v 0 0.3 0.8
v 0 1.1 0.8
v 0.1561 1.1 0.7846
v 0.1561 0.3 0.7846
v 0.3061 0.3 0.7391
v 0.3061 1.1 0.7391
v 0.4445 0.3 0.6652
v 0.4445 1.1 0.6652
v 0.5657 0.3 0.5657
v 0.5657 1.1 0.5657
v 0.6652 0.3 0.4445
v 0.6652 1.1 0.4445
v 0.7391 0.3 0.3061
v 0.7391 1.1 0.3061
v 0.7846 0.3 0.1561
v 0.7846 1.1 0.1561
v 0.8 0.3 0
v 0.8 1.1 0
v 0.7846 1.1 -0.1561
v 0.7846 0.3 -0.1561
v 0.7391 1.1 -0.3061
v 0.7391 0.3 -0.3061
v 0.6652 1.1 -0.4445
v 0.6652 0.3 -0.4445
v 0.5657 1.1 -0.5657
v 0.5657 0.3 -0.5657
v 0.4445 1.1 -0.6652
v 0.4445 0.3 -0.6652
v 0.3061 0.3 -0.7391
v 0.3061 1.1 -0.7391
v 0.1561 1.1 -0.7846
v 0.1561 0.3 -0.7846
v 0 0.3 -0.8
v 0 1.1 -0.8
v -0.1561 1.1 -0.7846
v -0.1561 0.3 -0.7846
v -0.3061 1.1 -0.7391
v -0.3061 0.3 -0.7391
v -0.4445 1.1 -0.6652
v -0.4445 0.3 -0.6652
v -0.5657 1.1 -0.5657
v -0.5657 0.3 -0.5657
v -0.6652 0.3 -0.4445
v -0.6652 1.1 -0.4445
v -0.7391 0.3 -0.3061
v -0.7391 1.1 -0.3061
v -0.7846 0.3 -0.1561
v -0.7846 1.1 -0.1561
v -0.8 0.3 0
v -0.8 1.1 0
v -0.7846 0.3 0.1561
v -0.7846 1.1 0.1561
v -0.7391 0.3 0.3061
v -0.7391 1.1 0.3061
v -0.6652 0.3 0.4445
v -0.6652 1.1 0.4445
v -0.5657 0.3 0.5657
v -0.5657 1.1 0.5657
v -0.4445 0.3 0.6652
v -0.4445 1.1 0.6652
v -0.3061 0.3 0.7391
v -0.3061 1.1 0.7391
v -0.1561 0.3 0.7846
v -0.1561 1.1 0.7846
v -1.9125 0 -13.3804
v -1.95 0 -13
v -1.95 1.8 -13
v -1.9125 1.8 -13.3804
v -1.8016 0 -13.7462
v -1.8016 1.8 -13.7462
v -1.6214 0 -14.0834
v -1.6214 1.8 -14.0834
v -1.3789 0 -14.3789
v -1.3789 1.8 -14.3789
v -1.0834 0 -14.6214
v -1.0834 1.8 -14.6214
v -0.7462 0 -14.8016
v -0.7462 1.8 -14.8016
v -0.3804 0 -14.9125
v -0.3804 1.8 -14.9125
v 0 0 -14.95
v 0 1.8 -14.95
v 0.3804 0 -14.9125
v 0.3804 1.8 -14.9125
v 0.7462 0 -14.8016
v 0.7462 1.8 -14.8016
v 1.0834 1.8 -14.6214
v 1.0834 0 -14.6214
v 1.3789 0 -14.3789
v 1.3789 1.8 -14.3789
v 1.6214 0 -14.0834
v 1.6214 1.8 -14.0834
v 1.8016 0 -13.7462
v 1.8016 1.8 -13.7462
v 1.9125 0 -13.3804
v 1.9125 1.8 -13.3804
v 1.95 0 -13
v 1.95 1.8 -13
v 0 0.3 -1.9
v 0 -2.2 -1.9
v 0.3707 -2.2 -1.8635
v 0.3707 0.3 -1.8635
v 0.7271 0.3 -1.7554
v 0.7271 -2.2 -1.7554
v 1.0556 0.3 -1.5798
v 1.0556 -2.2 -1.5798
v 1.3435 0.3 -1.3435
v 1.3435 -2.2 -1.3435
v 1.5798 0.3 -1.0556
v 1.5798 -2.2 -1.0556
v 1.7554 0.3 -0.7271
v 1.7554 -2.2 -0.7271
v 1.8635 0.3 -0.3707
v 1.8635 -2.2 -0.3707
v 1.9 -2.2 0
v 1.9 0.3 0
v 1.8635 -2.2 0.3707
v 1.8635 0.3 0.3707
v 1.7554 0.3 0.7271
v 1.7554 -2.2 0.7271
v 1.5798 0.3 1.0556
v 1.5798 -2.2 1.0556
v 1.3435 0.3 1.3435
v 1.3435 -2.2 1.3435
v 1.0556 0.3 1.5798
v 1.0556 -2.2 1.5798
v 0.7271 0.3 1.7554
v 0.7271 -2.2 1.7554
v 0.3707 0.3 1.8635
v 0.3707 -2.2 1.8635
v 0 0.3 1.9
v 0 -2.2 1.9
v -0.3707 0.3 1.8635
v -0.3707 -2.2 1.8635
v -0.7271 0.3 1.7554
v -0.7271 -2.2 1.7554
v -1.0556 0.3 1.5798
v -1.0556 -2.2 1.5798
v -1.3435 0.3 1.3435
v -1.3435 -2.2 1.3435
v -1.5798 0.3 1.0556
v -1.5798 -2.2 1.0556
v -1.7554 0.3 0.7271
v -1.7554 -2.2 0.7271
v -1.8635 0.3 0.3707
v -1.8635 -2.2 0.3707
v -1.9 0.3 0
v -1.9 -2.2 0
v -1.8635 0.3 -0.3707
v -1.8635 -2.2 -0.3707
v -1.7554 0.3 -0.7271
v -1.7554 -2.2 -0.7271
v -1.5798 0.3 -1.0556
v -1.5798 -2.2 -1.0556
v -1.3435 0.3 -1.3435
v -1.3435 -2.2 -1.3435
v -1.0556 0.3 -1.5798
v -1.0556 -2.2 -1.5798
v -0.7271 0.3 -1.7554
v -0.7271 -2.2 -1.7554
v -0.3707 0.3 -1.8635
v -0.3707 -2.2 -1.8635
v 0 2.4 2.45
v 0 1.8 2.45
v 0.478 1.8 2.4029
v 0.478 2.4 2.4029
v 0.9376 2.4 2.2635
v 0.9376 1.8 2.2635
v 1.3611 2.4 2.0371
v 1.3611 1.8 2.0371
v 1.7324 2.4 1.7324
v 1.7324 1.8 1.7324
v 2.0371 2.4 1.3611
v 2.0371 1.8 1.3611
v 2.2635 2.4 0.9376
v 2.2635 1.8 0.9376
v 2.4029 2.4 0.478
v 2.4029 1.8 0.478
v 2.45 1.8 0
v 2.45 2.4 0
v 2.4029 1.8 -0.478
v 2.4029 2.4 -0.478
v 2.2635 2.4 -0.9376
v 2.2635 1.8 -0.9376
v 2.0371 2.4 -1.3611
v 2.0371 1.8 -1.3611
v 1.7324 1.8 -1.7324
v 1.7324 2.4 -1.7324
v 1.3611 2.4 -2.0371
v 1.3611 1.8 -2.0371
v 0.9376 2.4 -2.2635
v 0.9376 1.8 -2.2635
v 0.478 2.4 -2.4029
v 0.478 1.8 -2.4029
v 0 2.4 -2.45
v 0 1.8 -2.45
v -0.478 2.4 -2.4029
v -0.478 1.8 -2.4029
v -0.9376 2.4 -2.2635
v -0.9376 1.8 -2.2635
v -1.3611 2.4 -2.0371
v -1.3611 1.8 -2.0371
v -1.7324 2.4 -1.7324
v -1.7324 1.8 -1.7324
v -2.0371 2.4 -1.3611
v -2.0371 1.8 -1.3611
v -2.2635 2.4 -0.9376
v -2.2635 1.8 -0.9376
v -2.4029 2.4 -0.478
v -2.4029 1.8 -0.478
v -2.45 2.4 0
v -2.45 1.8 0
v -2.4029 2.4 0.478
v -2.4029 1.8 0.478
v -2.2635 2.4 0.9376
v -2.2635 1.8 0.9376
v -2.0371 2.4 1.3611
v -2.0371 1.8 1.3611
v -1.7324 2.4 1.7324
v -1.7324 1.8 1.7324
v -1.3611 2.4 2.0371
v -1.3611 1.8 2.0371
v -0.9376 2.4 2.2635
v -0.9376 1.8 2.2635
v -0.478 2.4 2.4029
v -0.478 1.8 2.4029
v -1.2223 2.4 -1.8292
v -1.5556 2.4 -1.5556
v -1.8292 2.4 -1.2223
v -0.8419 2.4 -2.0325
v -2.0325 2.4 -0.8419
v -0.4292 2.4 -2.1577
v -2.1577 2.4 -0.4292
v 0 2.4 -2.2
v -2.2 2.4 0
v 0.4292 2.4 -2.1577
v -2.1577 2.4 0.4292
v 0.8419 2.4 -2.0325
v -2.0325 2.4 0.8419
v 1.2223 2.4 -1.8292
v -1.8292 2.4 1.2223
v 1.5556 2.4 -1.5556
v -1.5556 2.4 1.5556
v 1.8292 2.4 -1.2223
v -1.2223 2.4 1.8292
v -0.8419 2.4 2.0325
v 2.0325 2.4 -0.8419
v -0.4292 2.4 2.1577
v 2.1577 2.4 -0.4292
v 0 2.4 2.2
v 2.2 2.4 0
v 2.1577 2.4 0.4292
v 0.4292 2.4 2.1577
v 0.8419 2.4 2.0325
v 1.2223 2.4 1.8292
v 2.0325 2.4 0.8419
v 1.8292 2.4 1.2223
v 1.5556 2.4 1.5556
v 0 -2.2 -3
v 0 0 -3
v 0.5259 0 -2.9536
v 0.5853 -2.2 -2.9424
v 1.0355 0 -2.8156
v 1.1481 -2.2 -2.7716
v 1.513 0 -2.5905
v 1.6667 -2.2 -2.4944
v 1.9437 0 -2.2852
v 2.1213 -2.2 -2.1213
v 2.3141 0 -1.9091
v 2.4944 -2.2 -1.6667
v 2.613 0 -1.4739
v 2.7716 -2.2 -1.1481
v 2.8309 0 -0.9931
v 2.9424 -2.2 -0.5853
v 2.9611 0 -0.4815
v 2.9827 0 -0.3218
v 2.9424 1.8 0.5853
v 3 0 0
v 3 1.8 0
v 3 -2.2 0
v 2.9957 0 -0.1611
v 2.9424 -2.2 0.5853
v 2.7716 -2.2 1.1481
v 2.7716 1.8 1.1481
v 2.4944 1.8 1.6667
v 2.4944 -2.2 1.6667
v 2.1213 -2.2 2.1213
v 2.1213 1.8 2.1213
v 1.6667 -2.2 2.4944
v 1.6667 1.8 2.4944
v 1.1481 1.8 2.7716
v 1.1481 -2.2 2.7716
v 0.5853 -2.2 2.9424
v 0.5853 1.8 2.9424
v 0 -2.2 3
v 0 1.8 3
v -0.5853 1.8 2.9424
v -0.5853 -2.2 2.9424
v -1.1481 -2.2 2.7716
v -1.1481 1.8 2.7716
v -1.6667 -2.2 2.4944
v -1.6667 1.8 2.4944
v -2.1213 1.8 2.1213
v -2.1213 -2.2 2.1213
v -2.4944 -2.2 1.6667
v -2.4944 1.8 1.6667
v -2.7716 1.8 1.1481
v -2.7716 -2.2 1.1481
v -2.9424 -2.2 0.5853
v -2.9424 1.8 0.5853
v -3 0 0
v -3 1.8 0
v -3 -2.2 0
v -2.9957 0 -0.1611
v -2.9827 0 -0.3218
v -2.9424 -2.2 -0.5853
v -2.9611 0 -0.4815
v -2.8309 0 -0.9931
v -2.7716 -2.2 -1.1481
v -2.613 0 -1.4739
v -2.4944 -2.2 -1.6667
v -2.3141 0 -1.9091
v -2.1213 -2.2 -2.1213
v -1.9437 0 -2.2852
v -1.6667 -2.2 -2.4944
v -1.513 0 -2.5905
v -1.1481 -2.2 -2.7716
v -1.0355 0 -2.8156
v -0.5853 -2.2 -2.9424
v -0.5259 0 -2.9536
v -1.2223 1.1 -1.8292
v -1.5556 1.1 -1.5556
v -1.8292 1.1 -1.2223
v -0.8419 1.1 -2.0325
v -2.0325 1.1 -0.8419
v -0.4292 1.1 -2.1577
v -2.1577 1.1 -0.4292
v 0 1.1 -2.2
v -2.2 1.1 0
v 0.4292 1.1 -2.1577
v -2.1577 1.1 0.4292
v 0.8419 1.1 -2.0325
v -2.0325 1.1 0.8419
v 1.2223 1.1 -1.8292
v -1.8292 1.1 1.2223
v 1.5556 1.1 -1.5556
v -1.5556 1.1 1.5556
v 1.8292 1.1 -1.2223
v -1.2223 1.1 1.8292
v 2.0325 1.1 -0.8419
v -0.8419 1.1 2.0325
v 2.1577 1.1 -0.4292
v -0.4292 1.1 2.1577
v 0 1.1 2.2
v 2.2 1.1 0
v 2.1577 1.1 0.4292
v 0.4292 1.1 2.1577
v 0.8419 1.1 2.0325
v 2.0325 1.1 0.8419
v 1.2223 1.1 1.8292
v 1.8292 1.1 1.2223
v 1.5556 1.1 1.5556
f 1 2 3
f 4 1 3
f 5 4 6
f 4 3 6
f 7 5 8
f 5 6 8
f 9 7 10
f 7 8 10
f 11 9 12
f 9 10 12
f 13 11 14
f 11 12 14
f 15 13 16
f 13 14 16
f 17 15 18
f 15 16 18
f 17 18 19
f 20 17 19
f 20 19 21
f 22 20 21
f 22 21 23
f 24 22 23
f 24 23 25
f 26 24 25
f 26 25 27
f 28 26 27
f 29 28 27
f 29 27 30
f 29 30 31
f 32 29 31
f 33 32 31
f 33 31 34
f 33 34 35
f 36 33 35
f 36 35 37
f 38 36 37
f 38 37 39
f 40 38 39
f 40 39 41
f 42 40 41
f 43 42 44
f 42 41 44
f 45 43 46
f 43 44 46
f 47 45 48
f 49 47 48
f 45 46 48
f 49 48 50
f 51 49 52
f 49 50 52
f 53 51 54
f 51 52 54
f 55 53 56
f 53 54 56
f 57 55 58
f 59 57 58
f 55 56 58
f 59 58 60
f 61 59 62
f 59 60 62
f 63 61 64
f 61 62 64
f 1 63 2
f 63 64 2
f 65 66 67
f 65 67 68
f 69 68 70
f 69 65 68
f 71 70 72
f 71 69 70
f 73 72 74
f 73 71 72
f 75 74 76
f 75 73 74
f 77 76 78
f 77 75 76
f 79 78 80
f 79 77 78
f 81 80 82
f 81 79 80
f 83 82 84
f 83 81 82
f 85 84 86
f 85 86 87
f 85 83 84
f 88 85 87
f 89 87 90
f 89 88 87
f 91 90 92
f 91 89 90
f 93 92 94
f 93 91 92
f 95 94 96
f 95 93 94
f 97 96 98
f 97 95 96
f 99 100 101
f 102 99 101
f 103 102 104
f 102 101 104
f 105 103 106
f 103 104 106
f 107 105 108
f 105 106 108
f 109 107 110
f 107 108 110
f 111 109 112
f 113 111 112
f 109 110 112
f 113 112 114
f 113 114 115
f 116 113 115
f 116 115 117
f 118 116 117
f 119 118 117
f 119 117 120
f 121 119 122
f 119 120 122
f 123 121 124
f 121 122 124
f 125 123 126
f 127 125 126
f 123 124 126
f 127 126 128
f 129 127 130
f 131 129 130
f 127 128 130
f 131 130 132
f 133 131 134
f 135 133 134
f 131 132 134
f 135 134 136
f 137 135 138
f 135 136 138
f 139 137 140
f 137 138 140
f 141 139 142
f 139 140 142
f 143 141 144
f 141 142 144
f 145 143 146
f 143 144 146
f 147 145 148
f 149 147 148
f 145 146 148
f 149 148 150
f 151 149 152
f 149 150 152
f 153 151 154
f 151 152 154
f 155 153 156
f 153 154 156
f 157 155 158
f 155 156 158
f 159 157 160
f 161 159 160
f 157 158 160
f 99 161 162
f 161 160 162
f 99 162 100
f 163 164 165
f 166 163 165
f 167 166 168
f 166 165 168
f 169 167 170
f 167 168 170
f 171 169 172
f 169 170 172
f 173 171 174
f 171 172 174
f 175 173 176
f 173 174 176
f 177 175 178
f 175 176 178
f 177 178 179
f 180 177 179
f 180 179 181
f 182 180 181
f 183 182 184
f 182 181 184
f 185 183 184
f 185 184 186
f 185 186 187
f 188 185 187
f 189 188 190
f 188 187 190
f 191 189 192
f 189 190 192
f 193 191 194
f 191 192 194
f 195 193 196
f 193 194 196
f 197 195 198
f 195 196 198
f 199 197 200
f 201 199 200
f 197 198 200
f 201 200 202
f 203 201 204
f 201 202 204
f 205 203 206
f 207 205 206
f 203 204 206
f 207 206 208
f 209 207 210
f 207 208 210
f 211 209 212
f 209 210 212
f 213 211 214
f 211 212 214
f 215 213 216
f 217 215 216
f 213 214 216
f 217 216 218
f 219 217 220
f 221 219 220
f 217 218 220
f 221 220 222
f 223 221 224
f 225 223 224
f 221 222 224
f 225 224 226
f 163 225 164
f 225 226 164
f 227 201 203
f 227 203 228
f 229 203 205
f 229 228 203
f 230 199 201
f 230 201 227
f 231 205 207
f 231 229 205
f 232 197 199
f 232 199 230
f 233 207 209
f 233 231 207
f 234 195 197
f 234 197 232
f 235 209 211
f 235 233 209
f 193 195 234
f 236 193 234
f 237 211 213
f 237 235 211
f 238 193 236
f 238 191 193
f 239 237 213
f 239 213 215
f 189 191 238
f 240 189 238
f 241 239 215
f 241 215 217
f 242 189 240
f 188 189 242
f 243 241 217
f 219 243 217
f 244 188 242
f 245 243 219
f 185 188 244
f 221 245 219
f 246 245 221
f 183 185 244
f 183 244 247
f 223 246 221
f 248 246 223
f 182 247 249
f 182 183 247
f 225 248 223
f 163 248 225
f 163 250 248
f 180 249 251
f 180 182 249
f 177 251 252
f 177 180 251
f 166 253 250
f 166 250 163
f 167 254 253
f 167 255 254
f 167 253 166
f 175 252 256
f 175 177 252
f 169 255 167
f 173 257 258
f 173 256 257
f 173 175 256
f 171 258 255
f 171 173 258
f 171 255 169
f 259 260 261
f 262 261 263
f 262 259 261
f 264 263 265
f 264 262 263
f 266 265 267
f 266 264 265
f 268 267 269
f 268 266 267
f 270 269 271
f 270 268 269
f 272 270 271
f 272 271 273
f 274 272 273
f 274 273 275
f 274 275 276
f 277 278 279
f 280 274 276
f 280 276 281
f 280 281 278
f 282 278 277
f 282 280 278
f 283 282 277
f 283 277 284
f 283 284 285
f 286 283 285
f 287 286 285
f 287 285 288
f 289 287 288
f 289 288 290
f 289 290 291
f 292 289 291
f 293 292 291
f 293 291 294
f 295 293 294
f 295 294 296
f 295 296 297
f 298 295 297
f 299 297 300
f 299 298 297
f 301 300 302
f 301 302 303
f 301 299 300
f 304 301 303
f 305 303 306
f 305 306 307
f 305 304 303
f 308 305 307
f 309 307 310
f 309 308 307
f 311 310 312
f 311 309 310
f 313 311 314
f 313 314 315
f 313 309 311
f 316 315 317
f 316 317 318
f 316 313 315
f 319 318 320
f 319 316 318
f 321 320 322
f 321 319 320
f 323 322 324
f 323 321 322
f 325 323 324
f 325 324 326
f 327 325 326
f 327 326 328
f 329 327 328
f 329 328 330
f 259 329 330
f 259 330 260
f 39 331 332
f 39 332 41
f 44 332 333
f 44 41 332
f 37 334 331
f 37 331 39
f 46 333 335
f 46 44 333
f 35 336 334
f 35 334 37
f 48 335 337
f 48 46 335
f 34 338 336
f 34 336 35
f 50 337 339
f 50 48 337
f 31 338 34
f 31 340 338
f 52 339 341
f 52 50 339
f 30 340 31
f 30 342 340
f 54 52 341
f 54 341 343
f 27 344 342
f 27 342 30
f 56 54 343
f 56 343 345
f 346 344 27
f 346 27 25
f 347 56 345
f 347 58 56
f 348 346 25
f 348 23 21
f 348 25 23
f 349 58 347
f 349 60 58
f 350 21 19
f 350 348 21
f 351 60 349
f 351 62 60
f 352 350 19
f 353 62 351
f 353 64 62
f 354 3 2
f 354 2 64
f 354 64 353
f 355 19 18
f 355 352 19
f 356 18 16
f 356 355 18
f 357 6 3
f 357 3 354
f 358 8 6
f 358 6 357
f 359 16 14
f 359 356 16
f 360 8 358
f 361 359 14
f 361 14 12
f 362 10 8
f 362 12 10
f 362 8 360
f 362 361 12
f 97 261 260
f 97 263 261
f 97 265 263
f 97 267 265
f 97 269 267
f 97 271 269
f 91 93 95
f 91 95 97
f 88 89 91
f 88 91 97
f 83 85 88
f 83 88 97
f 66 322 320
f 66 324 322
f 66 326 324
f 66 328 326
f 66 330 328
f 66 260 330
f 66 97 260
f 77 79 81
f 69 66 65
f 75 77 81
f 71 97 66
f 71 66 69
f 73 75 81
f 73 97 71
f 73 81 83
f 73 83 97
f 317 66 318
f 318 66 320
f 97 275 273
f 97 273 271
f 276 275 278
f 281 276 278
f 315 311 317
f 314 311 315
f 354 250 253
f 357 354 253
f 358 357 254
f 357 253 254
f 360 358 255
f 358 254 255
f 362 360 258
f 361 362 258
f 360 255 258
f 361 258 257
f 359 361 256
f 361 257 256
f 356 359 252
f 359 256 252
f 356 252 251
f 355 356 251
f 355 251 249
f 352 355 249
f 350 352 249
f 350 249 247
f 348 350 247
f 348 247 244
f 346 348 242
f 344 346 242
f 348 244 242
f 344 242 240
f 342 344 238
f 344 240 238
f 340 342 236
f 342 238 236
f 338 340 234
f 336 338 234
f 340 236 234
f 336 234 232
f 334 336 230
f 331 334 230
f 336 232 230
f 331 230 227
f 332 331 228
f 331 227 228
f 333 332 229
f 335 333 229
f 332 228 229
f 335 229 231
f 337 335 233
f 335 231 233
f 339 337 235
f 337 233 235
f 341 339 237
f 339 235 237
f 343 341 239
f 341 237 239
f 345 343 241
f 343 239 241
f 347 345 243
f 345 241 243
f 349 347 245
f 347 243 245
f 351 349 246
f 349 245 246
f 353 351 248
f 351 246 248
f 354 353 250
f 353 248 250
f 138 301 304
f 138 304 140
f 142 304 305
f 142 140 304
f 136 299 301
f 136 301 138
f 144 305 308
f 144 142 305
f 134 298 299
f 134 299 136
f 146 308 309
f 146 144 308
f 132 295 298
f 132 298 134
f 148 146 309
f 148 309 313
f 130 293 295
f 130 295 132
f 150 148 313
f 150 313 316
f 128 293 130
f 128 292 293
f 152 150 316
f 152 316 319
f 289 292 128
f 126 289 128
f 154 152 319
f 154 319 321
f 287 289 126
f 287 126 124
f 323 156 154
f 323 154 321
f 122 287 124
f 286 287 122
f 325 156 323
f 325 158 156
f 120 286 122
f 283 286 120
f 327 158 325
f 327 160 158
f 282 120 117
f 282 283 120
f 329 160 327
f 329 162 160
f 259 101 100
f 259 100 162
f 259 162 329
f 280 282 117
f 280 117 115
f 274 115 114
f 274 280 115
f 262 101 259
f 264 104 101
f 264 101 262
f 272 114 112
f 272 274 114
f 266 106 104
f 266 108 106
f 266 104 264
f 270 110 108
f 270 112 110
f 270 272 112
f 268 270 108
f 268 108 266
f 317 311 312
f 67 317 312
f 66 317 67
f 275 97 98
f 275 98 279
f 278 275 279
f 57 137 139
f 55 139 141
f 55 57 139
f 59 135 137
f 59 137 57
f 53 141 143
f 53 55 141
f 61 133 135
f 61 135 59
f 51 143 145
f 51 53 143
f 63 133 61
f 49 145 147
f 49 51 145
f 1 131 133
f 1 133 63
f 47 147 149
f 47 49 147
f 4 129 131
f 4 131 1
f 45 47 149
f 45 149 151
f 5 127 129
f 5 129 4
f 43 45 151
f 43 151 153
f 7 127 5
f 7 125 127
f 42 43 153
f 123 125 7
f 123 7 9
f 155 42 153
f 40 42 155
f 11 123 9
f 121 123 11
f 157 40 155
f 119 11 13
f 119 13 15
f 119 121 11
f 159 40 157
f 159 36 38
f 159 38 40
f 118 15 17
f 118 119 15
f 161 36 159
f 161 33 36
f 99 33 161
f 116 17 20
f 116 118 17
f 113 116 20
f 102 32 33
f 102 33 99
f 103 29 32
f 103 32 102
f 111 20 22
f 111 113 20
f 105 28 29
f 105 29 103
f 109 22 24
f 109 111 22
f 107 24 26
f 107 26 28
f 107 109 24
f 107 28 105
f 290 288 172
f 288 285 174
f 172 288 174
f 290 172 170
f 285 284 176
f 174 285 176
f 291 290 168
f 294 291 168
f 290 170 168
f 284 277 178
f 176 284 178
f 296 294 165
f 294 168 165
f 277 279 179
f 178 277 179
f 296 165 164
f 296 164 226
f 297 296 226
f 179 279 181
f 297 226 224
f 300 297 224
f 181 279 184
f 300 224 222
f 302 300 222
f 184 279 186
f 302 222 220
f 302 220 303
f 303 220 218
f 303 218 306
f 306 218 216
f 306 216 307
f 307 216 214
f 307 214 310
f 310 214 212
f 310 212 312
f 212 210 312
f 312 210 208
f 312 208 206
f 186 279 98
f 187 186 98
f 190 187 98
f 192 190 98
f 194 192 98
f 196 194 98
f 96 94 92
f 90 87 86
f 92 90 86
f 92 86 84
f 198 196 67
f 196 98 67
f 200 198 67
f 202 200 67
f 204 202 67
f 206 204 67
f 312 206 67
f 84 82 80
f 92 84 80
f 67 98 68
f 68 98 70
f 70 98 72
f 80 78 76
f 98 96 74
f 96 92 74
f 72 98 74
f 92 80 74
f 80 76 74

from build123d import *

# Parameters (mm, degrees)
BOSS_EXTRUDE3_DEPTH = 1.8
SKETCH3_R           = 2.45
BOSS_EXTRUDE4_DEPTH = 0.6
SKETCH4_R           = 2.2
CUT_EXTRUDE1_DEPTH  = 1.3
SKETCH5_R           = 0.8
CUT_EXTRUDE2_DEPTH  = 3
BOSS_EXTRUDE5_START = 2.2
SKETCH6_R           = 3
BOSS_EXTRUDE5_DEPTH = 2.2
SKETCH7_R           = 1.9
CUT_EXTRUDE3_DEPTH  = 2.5


with BuildPart() as part:
    # Sketch1 → Boss-Extrude3 (new body)
    with BuildSketch(Plane(origin=(0, 0, 0), x_dir=(1, 0, 0), z_dir=(0, 1, 0))):
        with BuildLine():
            Line((-3, 0), (-1.95, 13))
            ThreePointArc((-1.95, 13), (0, 14.95), (1.95, 13))
            Line((1.95, 13), (3, 0))
            ThreePointArc((3, 0), (0, -3), (-3, 0))
        make_face()
    extrude(amount=BOSS_EXTRUDE3_DEPTH)

    # Sketch3 → Boss-Extrude4 (add)
    with BuildSketch(Plane(origin=(0, 1.8, 0), x_dir=(1, 0, 0), z_dir=(0, 1, 0))):
        with Locations(Location((0, 0, 0), (0, 0, 270))):
            Circle(SKETCH3_R)
    extrude(amount=BOSS_EXTRUDE4_DEPTH)

    # Sketch4 → Cut-Extrude1 (cut)
    with BuildSketch(Plane(origin=(0, 2.4, 0), x_dir=(1, 0, 0), z_dir=(0, 1, 0))):
        with Locations(Location((0, 0, 0), (0, 0, 270))):
            Circle(SKETCH4_R)
    extrude(amount=-CUT_EXTRUDE1_DEPTH, mode=Mode.SUBTRACT)

    # Sketch5 → Cut-Extrude2 (cut)
    with BuildSketch(Plane(origin=(0, 1.1, 0), x_dir=(1, 0, 0), z_dir=(0, 1, 0))):
        with Locations(Location((0, 0, 0), (0, 0, 270))):
            Circle(SKETCH5_R)
    extrude(amount=-CUT_EXTRUDE2_DEPTH, mode=Mode.SUBTRACT)

    # Sketch6 → Boss-Extrude5 (add)
    with BuildSketch(Plane.XZ.offset(BOSS_EXTRUDE5_START)):
        with Locations(Location((0, 0, 0), (0, 0, 270))):
            Circle(SKETCH6_R)
    extrude(amount=-BOSS_EXTRUDE5_DEPTH)

    # Sketch7 → Cut-Extrude3 (cut)
    with BuildSketch(Plane.XZ.offset(2.2)):
        with Locations(Location((0, 0, 0), (0, 0, 270))):
            Circle(SKETCH7_R)
    extrude(amount=-CUT_EXTRUDE3_DEPTH, mode=Mode.SUBTRACT)


solid = part.part
